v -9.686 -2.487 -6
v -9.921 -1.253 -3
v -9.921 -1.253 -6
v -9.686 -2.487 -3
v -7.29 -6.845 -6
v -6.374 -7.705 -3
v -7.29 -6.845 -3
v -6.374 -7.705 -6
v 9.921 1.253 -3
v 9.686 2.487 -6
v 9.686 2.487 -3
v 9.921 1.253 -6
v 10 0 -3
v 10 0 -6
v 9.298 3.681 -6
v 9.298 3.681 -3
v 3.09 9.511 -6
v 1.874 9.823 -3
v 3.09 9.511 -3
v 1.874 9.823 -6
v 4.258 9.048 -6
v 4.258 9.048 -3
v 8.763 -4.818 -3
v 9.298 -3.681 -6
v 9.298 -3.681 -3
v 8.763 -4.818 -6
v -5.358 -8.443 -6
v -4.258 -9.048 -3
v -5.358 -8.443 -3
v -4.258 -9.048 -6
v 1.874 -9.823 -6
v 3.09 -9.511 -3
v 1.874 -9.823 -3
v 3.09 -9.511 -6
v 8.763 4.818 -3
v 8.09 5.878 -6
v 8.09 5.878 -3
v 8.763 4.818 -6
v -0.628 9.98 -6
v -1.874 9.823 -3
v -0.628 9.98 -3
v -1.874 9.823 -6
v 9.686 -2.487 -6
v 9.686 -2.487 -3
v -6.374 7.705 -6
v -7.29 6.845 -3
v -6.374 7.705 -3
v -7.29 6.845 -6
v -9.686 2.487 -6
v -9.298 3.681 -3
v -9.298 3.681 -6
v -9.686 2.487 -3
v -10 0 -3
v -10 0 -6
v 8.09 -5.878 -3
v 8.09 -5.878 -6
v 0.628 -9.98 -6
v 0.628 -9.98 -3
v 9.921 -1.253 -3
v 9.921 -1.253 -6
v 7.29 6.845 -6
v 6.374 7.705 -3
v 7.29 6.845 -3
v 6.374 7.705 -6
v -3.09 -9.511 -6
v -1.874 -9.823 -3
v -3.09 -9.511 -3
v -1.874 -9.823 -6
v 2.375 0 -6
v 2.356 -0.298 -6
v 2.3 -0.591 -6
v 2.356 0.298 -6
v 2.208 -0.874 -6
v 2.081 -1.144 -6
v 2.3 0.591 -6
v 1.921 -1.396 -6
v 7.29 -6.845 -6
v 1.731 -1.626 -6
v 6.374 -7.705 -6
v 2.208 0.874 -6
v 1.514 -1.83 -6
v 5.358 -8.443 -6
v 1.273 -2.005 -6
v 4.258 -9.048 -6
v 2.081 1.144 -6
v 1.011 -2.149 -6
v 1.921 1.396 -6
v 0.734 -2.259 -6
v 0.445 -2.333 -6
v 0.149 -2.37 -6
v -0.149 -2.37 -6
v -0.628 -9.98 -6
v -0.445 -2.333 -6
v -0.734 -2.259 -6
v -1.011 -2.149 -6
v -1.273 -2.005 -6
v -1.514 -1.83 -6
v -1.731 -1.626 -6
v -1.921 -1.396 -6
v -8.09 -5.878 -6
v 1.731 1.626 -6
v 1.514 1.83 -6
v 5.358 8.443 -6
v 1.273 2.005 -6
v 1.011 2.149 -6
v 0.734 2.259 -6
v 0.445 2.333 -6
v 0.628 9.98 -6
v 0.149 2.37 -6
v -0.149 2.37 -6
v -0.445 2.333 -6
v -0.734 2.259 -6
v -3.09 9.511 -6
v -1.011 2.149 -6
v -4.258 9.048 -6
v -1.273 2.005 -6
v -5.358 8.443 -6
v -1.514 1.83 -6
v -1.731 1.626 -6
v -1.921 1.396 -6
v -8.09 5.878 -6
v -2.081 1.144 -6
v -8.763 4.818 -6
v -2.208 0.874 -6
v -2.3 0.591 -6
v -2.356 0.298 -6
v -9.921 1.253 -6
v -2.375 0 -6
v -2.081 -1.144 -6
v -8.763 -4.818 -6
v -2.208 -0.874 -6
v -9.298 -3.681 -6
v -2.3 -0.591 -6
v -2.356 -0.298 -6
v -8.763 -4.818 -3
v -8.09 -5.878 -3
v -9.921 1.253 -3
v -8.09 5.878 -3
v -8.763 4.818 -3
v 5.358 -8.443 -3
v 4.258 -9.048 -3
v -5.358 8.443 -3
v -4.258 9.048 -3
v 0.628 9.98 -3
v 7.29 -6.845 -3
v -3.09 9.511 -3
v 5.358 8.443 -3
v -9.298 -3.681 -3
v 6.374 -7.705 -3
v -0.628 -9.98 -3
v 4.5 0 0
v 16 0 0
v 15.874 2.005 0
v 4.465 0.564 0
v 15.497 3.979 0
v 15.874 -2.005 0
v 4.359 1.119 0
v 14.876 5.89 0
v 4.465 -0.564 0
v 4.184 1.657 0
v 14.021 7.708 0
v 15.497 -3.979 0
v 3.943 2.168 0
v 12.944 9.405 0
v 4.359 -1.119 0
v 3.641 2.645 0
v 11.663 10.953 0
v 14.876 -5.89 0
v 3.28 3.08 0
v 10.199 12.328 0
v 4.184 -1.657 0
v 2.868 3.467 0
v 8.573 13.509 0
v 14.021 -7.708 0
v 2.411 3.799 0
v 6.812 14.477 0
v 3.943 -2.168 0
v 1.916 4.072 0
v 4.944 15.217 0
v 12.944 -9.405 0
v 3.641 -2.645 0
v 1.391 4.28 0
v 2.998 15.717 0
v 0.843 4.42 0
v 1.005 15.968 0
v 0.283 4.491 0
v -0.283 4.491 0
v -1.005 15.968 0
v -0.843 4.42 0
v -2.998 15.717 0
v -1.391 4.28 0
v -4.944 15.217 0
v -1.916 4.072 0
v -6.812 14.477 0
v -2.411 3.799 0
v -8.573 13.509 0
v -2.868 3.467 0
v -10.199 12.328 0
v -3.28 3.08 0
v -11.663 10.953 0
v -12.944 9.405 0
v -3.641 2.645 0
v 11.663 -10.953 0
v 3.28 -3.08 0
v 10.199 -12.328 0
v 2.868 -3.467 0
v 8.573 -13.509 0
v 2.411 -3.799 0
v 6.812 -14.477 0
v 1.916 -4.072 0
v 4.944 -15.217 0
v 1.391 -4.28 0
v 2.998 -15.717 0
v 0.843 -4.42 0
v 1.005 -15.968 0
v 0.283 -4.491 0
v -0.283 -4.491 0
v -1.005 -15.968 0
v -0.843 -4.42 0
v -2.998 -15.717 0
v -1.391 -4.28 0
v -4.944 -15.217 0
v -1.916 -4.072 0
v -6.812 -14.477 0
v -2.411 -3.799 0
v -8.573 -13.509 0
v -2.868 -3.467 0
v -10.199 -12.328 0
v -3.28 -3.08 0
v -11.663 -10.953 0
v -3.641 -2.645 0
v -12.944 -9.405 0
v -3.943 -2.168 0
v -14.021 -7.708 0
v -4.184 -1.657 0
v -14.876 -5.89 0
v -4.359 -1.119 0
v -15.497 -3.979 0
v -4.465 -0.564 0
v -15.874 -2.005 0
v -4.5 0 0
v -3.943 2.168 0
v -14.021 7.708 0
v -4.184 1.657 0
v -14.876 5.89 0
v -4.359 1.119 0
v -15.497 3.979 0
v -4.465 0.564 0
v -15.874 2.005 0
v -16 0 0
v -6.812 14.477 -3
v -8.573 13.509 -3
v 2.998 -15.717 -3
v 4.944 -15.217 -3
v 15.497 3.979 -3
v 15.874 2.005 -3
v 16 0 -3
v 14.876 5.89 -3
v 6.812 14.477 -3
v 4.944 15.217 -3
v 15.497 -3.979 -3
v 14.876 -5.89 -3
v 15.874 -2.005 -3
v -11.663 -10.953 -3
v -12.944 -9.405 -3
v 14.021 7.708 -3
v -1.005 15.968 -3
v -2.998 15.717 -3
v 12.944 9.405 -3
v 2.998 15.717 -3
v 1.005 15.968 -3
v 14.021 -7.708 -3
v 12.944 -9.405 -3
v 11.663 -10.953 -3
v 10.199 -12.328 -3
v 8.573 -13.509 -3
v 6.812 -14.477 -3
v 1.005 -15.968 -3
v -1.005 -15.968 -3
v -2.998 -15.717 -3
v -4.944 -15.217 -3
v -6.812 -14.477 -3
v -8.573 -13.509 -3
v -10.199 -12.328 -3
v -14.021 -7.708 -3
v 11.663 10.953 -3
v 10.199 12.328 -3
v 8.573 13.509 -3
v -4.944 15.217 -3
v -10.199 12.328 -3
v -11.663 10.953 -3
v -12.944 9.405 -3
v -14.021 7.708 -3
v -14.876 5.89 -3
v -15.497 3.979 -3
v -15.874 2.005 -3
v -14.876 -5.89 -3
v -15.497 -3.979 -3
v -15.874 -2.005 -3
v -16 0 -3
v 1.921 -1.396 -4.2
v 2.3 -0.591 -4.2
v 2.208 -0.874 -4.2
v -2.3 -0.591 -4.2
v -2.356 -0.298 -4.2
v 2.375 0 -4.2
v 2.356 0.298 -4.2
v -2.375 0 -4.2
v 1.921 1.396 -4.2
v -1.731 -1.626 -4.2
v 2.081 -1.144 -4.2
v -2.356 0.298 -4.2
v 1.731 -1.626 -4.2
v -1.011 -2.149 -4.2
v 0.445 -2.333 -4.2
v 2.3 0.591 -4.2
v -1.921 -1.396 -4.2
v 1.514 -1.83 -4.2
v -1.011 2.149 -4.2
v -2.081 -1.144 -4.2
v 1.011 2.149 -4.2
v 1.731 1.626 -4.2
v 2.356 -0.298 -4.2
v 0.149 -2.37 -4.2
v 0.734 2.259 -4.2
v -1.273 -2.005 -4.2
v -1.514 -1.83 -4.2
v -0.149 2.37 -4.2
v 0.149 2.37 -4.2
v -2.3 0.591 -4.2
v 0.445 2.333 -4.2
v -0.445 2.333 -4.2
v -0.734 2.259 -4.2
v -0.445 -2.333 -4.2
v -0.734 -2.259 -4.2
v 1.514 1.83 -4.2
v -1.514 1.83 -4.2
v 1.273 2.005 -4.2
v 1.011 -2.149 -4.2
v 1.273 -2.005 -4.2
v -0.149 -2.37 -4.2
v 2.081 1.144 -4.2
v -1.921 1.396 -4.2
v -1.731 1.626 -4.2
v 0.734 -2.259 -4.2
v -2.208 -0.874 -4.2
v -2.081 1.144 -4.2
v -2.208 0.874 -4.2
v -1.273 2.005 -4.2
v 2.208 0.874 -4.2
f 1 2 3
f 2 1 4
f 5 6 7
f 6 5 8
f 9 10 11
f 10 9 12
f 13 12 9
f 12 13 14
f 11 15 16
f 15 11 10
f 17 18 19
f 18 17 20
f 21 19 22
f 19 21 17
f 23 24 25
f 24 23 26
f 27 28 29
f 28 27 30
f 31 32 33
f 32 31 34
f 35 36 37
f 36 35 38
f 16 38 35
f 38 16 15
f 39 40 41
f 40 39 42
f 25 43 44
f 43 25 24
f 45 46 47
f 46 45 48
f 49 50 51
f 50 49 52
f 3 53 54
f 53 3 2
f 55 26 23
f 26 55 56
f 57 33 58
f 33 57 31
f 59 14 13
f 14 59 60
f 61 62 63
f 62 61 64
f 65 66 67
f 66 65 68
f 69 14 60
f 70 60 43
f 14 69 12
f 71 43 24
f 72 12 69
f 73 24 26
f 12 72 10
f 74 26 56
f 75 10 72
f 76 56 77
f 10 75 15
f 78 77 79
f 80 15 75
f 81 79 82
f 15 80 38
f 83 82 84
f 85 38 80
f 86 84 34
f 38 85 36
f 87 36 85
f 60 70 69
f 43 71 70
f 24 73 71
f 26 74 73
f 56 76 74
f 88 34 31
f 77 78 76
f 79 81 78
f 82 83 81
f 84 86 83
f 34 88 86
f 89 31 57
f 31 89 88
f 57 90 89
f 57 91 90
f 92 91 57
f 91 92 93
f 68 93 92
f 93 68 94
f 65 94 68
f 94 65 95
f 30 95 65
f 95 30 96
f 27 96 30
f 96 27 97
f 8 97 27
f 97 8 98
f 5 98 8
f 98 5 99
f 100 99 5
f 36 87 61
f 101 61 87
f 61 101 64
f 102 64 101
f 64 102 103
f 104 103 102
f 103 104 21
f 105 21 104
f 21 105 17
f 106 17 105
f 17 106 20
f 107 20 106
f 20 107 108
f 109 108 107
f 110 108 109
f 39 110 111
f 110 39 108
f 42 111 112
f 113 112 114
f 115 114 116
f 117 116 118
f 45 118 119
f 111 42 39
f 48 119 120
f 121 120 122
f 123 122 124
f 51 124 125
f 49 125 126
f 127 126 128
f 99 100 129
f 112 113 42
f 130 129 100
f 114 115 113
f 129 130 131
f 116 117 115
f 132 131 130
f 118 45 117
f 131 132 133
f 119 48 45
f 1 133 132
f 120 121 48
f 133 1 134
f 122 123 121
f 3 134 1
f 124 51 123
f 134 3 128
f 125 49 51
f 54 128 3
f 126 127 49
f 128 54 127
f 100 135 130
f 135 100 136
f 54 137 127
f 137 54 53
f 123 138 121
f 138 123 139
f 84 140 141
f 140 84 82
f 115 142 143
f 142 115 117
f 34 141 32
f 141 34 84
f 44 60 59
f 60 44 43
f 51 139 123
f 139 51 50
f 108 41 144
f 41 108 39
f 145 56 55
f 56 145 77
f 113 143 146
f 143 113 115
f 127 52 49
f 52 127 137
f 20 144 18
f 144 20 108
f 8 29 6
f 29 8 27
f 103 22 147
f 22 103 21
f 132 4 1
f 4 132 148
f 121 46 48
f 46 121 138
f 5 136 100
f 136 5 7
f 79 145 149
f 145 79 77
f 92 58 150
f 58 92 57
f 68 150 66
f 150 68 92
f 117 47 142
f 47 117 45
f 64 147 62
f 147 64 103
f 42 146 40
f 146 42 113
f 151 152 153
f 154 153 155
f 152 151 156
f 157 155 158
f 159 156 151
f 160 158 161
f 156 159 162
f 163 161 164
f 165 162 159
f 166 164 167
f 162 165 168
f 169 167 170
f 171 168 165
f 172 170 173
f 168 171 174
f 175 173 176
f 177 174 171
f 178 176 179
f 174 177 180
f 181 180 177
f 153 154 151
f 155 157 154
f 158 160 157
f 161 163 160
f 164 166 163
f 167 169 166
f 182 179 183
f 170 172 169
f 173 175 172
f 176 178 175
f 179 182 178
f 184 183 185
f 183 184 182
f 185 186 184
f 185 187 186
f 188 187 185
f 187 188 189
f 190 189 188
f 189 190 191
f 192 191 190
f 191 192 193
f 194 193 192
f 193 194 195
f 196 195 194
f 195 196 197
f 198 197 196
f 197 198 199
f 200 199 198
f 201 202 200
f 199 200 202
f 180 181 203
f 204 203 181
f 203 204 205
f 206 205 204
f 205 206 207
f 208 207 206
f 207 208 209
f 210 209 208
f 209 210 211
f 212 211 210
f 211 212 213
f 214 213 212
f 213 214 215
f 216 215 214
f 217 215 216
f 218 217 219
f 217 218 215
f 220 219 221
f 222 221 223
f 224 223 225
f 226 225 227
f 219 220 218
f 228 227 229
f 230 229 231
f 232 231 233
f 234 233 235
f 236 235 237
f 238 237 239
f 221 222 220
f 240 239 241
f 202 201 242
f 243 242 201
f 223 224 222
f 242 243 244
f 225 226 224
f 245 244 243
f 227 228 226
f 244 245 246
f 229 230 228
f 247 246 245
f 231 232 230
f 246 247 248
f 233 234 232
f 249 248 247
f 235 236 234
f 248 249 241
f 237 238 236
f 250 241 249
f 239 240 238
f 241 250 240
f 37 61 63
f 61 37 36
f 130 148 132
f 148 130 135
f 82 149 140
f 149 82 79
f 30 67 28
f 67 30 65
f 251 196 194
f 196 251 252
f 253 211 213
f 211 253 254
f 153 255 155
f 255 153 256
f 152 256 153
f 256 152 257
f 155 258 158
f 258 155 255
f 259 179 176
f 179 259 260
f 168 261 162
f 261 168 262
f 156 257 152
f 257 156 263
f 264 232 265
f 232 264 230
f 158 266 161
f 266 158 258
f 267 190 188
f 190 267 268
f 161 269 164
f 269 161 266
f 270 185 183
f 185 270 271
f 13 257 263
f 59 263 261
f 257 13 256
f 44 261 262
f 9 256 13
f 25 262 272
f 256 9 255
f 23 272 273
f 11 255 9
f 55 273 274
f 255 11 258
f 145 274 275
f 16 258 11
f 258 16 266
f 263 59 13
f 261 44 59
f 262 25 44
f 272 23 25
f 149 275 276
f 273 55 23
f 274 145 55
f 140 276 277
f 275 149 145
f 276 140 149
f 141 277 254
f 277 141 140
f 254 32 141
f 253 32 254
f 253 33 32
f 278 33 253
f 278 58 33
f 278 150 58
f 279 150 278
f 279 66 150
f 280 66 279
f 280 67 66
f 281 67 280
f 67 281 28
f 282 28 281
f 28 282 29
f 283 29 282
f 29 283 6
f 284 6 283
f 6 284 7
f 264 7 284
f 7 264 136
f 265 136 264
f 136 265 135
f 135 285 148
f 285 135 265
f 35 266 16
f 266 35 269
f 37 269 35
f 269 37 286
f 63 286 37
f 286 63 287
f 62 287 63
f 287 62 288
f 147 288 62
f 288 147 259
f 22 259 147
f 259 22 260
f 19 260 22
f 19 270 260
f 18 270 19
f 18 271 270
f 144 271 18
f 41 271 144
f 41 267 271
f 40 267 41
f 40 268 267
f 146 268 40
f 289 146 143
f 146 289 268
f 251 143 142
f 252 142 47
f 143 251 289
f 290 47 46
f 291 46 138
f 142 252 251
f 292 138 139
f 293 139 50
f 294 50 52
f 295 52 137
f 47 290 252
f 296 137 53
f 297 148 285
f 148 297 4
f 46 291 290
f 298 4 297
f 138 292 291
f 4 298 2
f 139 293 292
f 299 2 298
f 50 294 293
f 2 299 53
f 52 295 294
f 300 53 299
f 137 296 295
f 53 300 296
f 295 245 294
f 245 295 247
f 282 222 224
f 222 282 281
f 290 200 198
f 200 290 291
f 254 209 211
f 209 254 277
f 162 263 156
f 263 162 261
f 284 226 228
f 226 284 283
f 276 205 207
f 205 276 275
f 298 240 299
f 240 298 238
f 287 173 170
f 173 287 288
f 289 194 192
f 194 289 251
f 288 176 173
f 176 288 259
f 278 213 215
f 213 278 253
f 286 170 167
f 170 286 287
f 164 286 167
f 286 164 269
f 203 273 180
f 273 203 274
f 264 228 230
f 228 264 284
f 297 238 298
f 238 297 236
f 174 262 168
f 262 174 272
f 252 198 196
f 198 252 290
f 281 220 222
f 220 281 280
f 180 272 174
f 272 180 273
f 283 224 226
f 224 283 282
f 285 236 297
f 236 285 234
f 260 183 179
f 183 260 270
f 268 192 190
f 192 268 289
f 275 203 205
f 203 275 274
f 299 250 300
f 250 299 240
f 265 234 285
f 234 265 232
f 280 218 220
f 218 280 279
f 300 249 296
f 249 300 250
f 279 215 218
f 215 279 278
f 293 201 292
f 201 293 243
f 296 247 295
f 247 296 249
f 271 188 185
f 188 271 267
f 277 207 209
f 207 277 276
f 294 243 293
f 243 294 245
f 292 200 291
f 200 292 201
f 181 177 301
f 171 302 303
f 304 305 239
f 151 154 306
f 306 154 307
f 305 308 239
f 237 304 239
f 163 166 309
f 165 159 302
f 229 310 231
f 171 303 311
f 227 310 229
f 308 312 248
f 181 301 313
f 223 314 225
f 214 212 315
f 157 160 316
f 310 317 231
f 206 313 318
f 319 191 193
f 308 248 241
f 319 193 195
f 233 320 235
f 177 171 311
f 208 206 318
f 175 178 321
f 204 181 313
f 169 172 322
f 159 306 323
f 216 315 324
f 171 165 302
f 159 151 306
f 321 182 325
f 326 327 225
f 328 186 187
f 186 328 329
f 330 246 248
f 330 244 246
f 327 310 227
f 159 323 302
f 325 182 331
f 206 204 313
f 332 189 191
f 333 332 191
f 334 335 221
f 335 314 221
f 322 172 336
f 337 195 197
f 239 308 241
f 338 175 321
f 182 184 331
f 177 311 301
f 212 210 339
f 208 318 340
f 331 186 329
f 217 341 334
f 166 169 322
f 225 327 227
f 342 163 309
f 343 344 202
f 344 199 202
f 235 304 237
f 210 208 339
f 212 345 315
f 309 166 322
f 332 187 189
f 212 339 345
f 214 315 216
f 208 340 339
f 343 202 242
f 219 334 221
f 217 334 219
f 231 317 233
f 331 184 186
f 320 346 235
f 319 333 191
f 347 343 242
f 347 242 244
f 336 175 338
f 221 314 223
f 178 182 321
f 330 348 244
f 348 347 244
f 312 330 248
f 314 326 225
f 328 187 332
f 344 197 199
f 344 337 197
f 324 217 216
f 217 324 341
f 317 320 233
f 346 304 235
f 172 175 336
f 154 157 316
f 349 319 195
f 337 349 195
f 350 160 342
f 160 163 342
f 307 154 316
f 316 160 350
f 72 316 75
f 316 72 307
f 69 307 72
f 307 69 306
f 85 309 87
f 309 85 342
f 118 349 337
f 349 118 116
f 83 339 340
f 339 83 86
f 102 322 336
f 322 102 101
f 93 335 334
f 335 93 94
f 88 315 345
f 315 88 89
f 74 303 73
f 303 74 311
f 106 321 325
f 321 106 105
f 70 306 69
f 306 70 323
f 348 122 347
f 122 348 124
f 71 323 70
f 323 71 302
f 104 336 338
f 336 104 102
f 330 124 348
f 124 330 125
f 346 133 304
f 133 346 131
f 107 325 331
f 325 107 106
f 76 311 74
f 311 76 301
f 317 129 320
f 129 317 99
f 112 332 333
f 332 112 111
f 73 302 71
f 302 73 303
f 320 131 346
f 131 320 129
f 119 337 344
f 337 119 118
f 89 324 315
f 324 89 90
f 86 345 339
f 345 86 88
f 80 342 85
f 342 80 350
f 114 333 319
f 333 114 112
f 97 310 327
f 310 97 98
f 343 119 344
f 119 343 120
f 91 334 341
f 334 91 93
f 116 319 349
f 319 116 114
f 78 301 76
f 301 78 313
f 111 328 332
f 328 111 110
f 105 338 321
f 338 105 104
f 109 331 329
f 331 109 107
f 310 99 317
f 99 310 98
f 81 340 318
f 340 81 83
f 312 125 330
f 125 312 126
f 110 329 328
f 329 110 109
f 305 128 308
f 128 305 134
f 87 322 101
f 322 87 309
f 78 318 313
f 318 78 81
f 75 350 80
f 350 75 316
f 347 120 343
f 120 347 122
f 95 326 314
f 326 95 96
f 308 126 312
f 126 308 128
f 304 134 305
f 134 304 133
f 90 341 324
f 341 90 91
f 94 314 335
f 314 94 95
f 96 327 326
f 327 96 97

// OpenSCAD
$fn = 50;


difference() {
	union() {
		translate(v = [0, 0, -6.0000000000]) {
			cylinder(h = 6, r = 10.0000000000);
		}
		translate(v = [0, 0, -3.0000000000]) {
			cylinder(h = 3, r = 16.0000000000);
		}
	}
	union() {
		translate(v = [0, 0, 0]) {
			rotate(a = [0, 0, 0]) {
				difference() {
					union() {
						#translate(v = [0, 0, -6.0000000000]) {
							cylinder(h = 6, r = 2.2500000000);
						}
						#translate(v = [0, 0, -4.2000000000]) {
							cylinder(h = 4.2000000000, r1 = 2.3750000000, r2 = 4.5000000000);
						}
						#translate(v = [0, 0, -6.0000000000]) {
							cylinder(h = 6, r = 2.3750000000);
						}
						#translate(v = [0, 0, -6.0000000000]) {
							cylinder(h = 6, r = 2.2500000000);
						}
					}
					union();
				}
			}
		}
	}
}
